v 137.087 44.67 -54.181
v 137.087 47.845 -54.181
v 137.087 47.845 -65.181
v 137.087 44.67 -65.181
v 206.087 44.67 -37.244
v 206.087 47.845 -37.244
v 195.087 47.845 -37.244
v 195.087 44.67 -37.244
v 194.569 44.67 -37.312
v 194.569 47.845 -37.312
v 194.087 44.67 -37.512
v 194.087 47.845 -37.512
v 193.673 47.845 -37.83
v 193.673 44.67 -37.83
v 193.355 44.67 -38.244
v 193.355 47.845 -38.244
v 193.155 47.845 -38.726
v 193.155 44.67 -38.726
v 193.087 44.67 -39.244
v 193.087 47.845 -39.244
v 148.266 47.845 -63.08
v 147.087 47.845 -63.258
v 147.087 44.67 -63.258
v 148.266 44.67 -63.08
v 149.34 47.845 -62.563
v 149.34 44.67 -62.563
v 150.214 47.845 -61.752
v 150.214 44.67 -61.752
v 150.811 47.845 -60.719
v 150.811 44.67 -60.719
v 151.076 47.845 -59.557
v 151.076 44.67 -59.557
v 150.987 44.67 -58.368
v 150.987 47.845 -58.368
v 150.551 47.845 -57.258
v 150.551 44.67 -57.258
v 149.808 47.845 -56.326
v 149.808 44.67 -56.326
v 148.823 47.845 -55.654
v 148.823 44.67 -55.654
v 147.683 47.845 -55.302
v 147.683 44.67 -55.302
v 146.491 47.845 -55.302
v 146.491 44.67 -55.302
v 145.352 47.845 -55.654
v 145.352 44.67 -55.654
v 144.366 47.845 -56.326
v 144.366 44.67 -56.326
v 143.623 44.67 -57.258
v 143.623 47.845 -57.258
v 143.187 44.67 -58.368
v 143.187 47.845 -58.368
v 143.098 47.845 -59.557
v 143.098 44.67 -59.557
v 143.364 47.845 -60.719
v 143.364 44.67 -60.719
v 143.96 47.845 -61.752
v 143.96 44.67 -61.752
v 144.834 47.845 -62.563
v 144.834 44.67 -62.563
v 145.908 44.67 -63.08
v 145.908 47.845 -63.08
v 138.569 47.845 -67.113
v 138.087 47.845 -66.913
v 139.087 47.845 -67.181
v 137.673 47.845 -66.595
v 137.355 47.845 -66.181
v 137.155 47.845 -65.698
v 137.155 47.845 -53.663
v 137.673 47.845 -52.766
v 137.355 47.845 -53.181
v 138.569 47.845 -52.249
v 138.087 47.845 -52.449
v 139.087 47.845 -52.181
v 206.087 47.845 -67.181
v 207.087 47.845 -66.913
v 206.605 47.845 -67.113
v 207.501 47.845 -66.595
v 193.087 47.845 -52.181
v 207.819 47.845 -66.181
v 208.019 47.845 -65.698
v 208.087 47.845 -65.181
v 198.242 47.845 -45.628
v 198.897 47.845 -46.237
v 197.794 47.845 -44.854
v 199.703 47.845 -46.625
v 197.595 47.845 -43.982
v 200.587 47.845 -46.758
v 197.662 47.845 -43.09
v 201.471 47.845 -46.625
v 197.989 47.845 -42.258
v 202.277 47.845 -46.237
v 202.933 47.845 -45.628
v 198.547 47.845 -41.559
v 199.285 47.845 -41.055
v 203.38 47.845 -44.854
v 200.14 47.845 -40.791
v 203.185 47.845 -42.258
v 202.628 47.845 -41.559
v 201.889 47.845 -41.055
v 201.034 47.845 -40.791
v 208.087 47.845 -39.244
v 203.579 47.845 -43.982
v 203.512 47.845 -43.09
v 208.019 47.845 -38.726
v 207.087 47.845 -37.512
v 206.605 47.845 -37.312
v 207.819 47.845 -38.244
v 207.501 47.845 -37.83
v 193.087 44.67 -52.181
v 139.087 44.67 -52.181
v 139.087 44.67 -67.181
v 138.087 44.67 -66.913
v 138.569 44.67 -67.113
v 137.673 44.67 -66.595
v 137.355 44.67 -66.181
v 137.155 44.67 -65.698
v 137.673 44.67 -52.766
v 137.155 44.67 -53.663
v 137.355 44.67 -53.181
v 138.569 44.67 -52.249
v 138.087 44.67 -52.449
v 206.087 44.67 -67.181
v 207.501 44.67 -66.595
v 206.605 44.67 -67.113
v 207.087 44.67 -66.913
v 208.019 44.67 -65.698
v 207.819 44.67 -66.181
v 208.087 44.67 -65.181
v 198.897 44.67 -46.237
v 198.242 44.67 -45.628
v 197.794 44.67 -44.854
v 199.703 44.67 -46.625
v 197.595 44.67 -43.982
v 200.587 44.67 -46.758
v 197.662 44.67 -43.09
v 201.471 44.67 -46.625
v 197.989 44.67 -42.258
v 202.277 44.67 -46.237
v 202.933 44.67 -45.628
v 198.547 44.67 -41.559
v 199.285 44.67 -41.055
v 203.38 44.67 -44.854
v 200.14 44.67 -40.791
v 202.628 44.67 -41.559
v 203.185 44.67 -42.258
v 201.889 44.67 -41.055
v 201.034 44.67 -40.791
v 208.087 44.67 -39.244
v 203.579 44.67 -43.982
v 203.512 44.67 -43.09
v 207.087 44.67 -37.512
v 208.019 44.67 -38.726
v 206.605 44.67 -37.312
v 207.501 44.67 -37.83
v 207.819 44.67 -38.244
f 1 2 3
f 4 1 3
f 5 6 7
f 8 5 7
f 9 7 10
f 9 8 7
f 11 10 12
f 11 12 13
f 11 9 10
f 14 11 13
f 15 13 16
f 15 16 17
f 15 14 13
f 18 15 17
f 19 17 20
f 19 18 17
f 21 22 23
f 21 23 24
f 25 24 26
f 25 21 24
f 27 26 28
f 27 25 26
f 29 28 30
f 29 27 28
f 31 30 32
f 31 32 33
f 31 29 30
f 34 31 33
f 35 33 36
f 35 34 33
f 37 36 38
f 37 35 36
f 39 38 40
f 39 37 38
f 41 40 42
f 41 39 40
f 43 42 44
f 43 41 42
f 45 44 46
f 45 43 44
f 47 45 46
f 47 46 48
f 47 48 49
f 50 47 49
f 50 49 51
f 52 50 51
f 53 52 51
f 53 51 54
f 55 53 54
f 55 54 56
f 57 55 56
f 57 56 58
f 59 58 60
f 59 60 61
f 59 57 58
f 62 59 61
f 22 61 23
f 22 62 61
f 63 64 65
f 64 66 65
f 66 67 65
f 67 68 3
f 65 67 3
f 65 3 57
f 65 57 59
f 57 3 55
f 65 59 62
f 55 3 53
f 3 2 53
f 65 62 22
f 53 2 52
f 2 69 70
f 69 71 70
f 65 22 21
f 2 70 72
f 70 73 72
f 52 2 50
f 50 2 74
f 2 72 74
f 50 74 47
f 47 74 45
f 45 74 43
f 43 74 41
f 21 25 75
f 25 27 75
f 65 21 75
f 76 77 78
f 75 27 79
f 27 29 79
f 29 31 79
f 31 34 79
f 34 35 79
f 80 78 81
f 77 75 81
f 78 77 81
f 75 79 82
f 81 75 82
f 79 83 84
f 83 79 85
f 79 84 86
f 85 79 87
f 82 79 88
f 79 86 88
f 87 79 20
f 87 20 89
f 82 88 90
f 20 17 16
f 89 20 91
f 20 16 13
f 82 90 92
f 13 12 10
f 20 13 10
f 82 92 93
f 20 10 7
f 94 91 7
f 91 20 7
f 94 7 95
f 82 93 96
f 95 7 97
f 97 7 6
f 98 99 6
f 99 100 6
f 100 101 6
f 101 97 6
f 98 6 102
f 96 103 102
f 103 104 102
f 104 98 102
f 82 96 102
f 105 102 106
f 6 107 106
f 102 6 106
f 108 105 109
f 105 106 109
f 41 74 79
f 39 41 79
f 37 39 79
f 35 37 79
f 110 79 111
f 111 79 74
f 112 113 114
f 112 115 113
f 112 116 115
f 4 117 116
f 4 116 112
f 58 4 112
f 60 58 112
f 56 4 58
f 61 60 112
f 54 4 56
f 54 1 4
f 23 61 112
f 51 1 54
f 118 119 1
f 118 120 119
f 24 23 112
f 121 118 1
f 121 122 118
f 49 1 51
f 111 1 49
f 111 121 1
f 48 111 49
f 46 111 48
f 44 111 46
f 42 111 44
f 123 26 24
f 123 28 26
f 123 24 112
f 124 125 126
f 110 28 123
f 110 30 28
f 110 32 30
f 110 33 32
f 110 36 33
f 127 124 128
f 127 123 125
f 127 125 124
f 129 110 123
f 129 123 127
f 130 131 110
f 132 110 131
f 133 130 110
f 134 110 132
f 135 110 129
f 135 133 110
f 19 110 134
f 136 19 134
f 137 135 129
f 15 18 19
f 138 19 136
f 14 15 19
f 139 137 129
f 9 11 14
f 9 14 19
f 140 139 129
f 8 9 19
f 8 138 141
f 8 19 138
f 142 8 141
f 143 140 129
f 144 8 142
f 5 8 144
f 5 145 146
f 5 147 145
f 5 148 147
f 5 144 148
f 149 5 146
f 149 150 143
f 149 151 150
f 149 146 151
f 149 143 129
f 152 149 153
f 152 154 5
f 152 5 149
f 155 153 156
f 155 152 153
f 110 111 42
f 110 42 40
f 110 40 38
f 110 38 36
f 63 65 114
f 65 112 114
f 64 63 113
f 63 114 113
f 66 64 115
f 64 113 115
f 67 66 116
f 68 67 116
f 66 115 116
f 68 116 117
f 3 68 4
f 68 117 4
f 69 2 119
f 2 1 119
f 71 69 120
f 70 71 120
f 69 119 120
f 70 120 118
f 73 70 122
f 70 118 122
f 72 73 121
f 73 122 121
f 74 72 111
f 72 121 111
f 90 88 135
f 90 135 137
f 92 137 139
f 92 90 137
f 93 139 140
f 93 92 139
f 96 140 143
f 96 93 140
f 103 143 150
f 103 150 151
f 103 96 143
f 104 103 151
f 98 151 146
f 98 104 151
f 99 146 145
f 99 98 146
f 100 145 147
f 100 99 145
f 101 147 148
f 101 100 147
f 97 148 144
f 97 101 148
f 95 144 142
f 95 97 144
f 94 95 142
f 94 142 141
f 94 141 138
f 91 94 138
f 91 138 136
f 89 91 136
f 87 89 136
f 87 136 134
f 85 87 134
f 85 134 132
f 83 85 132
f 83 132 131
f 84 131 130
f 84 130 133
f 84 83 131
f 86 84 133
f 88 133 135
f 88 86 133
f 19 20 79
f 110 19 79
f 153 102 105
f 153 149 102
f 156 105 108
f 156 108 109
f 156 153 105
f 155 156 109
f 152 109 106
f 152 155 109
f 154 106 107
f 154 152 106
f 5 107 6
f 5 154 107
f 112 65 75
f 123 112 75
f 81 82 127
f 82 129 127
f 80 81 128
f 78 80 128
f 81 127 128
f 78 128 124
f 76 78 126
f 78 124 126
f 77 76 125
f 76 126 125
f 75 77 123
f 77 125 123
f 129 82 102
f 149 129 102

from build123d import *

# Parameters (mm, degrees)
SKETCH2_R          = 4
SKETCH2_R_2        = 3
BASE_FLANGE1_DEPTH = 3.175
FILLET1_R          = 2


# Sheet-metal steps are written as plain solids
with BuildPart() as part:
    # Sketch2 → Base-Flange1 (new body)
    with BuildSketch(Plane.XZ.offset(-47.844717124)):
        Polygon((208.087093798, -67.18067292), (208.087093798, -37.24408426), (193.087093798, -37.24408426), (193.087093798, -52.18067292), (137.087093798, -52.18067292), (137.087093798, -67.18067292), align=None)
        with Locations(Location((147.087093798, -59.257788189, 0), (0, 0, 270))):
            Circle(SKETCH2_R, mode=Mode.SUBTRACT)
        with Locations(Location((200.587093798, -43.757788189, 0), (0, 0, 270))):
            Circle(SKETCH2_R_2, mode=Mode.SUBTRACT)
    extrude(amount=BASE_FLANGE1_DEPTH)

    # Fillet1
    fillet1_edges = [part.edges().sort_by_distance(p)[0] for p in [
        (193.087093798, 46.257217124, -37.24408426),
        (208.087093798, 46.257217124, -37.24408426),
        (208.087093798, 46.257217124, -67.18067292),
        (137.087093798, 46.257217124, -67.18067292),
        (137.087093798, 46.257217124, -52.18067292),
    ]]
    fillet(fillet1_edges, radius=FILLET1_R)


solid = part.part
